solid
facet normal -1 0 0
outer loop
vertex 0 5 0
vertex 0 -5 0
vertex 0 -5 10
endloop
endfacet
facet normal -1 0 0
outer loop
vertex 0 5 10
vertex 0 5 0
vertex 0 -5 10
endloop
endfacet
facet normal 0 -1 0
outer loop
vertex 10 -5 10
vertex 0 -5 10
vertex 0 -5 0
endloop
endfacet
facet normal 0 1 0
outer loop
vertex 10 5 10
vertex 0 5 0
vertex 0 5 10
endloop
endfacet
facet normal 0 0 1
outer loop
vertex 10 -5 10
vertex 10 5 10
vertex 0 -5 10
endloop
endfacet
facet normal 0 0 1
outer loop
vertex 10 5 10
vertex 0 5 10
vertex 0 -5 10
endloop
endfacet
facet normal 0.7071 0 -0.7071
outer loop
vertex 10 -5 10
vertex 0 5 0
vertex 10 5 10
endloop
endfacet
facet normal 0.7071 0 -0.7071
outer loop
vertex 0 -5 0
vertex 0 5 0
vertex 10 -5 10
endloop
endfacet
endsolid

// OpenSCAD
X=10;
Y=10;
Z=10;
cube_size = 20; // [10:Small,20:Medium,30:Large]

hole_diameter = 2.5;
hole_radius = hole_diameter/2;

// How deep should the center hole be?
hole_depth = 1; // [0,1,5,50]

show_wheels = "yes"; // [yes,no]

// How thick should the side wheels be?
wheel_thickness = 1; // [1:20]

// ignore this variable!
// foo=1;

// don't turn functions into params!
function BEZ03(u) = pow((1-u), 3);

// ignore variable values
bing = 3+4;
baz = 3 / hole_depth;
module object1(scale) {polyhedron(points = [[0, -10, 60], [0, 10, 60], [0, 10, 0], [0, -10, 0], [60, -10, 60], [60, 10, 60]], 
triangles = [[0,3,2], [0,2,1], [3,0,4], [1,2,5], [0,5,4], [0,1,5],  [5,2,4], [4,2,3], ]);}

resize(newsize=[X,Y,Z]) object1(1);

